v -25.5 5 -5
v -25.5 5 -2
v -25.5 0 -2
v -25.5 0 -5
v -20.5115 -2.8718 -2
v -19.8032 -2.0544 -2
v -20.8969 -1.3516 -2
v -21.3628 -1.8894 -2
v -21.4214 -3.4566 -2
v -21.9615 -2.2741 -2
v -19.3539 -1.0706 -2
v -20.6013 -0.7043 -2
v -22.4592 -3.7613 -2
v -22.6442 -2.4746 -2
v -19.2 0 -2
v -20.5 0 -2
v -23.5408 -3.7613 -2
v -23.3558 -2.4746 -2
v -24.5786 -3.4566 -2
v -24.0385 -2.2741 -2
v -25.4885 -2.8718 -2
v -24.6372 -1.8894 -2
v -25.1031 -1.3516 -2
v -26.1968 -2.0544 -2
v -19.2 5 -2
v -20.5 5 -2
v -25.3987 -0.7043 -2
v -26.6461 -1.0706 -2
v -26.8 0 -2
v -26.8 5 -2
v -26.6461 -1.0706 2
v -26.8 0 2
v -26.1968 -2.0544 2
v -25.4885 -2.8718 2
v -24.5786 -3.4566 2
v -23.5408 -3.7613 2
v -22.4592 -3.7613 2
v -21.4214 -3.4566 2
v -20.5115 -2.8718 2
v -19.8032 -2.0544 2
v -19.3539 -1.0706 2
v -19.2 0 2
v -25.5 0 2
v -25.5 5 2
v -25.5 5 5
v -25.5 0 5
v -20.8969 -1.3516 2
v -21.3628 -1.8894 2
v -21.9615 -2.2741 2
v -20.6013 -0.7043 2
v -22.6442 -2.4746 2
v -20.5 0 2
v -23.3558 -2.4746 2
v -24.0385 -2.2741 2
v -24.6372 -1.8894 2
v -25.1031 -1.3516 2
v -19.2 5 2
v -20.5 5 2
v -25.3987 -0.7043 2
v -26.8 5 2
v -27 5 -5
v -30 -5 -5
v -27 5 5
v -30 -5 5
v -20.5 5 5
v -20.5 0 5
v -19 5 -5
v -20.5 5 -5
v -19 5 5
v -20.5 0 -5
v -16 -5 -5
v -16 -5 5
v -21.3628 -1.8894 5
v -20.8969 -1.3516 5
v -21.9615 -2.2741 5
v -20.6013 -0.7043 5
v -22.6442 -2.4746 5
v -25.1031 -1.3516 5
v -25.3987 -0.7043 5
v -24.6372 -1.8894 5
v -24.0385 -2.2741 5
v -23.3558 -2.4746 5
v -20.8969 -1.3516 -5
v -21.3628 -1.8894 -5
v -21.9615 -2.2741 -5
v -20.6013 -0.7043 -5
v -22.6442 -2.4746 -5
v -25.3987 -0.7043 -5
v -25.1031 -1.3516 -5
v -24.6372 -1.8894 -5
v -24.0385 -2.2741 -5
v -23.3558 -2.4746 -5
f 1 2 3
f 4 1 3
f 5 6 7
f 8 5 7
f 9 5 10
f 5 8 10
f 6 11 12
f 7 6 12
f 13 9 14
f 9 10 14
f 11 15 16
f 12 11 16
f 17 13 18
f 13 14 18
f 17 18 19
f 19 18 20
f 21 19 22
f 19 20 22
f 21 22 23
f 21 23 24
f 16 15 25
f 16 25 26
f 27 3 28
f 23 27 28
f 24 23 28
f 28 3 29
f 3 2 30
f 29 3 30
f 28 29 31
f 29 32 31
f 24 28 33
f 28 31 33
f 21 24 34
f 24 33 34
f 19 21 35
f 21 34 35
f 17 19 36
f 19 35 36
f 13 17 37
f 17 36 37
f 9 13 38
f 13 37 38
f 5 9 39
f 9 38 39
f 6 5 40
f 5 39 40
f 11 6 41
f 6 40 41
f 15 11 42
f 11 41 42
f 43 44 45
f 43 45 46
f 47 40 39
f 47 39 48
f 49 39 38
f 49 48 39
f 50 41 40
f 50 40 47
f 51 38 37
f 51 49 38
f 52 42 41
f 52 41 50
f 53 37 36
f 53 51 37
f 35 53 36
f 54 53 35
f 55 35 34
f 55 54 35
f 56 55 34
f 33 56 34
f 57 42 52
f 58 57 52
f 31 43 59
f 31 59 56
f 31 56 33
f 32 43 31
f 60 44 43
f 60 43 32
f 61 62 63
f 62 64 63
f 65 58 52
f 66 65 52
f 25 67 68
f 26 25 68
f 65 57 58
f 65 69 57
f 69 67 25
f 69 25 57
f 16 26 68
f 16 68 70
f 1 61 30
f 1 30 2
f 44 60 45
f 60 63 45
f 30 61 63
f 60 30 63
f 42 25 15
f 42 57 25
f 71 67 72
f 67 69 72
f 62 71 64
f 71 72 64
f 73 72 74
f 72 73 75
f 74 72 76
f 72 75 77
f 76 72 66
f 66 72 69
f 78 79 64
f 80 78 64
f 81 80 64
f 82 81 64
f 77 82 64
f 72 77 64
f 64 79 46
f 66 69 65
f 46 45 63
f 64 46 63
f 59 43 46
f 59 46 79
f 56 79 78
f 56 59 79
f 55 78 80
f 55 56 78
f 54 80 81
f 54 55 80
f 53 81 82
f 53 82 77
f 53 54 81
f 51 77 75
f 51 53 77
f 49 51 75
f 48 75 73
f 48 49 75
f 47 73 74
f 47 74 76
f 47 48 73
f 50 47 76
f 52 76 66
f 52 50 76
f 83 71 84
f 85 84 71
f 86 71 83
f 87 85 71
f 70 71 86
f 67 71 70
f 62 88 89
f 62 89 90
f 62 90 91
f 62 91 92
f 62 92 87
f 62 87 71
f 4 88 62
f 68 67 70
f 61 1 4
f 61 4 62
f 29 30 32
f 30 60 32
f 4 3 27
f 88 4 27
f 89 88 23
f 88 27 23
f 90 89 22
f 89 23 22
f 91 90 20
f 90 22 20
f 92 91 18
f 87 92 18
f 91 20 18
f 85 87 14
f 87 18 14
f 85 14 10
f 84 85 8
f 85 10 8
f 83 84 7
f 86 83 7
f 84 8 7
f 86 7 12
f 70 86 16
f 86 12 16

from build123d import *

# Parameters (mm, degrees)
PAD_DEPTH    = 2
PAD001_DEPTH = 3


with BuildPart() as part:
    # Sketch → Pad (new body, symmetric)
    with BuildSketch(Plane.XY):
        with BuildLine():
            Line((-7, -4.999991), (-4, 5.000009))
            Line((-4, 5.000009), (-3.799991, 5.000009))
            Line((-3.799991, 5.000009), (-3.799991, 0))
            ThreePointArc((-3.799991, 0), (0, -3.799991), (3.799991, 0))
            Line((3.799991, 5.000009), (3.799991, 0))
            Line((4, 5.000009), (3.799991, 5.000009))
            Line((4, 5.000009), (7, -4.999991))
            Line((7, -4.999991), (-7, -4.999991))
        make_face()
    extrude(amount=PAD_DEPTH, both=True)

    # Sketch004 (on Face10 of Pad) → Pad001 (join)
    with BuildSketch(Plane.XY.offset(2)):
        with BuildLine():
            ThreePointArc((-2.5, 0), (0, -2.5), (2.5, 0))
            Line((2.5, 5.000009), (2.5, 0))
            Line((4, 5.000009), (2.5, 5.000009))
            Line((4, 5.000009), (7, -4.999991))
            Line((7, -4.999991), (-7, -4.999991))
            Line((-7, -4.999991), (-4, 5.000009))
            Line((-4, 5.000009), (-2.5, 5.000009))
            Line((-2.5, 5.000009), (-2.5, 0))
        make_face()
    pad001 = extrude(amount=PAD001_DEPTH)

    # Mirrored: Pad001 across XY
    add(pad001.mirror(Plane.XY))


with BuildPart() as part_1:
    # Body placement: moved
    add(part.part.moved(Location((-23, 0, 0))))


solid = part_1.part
